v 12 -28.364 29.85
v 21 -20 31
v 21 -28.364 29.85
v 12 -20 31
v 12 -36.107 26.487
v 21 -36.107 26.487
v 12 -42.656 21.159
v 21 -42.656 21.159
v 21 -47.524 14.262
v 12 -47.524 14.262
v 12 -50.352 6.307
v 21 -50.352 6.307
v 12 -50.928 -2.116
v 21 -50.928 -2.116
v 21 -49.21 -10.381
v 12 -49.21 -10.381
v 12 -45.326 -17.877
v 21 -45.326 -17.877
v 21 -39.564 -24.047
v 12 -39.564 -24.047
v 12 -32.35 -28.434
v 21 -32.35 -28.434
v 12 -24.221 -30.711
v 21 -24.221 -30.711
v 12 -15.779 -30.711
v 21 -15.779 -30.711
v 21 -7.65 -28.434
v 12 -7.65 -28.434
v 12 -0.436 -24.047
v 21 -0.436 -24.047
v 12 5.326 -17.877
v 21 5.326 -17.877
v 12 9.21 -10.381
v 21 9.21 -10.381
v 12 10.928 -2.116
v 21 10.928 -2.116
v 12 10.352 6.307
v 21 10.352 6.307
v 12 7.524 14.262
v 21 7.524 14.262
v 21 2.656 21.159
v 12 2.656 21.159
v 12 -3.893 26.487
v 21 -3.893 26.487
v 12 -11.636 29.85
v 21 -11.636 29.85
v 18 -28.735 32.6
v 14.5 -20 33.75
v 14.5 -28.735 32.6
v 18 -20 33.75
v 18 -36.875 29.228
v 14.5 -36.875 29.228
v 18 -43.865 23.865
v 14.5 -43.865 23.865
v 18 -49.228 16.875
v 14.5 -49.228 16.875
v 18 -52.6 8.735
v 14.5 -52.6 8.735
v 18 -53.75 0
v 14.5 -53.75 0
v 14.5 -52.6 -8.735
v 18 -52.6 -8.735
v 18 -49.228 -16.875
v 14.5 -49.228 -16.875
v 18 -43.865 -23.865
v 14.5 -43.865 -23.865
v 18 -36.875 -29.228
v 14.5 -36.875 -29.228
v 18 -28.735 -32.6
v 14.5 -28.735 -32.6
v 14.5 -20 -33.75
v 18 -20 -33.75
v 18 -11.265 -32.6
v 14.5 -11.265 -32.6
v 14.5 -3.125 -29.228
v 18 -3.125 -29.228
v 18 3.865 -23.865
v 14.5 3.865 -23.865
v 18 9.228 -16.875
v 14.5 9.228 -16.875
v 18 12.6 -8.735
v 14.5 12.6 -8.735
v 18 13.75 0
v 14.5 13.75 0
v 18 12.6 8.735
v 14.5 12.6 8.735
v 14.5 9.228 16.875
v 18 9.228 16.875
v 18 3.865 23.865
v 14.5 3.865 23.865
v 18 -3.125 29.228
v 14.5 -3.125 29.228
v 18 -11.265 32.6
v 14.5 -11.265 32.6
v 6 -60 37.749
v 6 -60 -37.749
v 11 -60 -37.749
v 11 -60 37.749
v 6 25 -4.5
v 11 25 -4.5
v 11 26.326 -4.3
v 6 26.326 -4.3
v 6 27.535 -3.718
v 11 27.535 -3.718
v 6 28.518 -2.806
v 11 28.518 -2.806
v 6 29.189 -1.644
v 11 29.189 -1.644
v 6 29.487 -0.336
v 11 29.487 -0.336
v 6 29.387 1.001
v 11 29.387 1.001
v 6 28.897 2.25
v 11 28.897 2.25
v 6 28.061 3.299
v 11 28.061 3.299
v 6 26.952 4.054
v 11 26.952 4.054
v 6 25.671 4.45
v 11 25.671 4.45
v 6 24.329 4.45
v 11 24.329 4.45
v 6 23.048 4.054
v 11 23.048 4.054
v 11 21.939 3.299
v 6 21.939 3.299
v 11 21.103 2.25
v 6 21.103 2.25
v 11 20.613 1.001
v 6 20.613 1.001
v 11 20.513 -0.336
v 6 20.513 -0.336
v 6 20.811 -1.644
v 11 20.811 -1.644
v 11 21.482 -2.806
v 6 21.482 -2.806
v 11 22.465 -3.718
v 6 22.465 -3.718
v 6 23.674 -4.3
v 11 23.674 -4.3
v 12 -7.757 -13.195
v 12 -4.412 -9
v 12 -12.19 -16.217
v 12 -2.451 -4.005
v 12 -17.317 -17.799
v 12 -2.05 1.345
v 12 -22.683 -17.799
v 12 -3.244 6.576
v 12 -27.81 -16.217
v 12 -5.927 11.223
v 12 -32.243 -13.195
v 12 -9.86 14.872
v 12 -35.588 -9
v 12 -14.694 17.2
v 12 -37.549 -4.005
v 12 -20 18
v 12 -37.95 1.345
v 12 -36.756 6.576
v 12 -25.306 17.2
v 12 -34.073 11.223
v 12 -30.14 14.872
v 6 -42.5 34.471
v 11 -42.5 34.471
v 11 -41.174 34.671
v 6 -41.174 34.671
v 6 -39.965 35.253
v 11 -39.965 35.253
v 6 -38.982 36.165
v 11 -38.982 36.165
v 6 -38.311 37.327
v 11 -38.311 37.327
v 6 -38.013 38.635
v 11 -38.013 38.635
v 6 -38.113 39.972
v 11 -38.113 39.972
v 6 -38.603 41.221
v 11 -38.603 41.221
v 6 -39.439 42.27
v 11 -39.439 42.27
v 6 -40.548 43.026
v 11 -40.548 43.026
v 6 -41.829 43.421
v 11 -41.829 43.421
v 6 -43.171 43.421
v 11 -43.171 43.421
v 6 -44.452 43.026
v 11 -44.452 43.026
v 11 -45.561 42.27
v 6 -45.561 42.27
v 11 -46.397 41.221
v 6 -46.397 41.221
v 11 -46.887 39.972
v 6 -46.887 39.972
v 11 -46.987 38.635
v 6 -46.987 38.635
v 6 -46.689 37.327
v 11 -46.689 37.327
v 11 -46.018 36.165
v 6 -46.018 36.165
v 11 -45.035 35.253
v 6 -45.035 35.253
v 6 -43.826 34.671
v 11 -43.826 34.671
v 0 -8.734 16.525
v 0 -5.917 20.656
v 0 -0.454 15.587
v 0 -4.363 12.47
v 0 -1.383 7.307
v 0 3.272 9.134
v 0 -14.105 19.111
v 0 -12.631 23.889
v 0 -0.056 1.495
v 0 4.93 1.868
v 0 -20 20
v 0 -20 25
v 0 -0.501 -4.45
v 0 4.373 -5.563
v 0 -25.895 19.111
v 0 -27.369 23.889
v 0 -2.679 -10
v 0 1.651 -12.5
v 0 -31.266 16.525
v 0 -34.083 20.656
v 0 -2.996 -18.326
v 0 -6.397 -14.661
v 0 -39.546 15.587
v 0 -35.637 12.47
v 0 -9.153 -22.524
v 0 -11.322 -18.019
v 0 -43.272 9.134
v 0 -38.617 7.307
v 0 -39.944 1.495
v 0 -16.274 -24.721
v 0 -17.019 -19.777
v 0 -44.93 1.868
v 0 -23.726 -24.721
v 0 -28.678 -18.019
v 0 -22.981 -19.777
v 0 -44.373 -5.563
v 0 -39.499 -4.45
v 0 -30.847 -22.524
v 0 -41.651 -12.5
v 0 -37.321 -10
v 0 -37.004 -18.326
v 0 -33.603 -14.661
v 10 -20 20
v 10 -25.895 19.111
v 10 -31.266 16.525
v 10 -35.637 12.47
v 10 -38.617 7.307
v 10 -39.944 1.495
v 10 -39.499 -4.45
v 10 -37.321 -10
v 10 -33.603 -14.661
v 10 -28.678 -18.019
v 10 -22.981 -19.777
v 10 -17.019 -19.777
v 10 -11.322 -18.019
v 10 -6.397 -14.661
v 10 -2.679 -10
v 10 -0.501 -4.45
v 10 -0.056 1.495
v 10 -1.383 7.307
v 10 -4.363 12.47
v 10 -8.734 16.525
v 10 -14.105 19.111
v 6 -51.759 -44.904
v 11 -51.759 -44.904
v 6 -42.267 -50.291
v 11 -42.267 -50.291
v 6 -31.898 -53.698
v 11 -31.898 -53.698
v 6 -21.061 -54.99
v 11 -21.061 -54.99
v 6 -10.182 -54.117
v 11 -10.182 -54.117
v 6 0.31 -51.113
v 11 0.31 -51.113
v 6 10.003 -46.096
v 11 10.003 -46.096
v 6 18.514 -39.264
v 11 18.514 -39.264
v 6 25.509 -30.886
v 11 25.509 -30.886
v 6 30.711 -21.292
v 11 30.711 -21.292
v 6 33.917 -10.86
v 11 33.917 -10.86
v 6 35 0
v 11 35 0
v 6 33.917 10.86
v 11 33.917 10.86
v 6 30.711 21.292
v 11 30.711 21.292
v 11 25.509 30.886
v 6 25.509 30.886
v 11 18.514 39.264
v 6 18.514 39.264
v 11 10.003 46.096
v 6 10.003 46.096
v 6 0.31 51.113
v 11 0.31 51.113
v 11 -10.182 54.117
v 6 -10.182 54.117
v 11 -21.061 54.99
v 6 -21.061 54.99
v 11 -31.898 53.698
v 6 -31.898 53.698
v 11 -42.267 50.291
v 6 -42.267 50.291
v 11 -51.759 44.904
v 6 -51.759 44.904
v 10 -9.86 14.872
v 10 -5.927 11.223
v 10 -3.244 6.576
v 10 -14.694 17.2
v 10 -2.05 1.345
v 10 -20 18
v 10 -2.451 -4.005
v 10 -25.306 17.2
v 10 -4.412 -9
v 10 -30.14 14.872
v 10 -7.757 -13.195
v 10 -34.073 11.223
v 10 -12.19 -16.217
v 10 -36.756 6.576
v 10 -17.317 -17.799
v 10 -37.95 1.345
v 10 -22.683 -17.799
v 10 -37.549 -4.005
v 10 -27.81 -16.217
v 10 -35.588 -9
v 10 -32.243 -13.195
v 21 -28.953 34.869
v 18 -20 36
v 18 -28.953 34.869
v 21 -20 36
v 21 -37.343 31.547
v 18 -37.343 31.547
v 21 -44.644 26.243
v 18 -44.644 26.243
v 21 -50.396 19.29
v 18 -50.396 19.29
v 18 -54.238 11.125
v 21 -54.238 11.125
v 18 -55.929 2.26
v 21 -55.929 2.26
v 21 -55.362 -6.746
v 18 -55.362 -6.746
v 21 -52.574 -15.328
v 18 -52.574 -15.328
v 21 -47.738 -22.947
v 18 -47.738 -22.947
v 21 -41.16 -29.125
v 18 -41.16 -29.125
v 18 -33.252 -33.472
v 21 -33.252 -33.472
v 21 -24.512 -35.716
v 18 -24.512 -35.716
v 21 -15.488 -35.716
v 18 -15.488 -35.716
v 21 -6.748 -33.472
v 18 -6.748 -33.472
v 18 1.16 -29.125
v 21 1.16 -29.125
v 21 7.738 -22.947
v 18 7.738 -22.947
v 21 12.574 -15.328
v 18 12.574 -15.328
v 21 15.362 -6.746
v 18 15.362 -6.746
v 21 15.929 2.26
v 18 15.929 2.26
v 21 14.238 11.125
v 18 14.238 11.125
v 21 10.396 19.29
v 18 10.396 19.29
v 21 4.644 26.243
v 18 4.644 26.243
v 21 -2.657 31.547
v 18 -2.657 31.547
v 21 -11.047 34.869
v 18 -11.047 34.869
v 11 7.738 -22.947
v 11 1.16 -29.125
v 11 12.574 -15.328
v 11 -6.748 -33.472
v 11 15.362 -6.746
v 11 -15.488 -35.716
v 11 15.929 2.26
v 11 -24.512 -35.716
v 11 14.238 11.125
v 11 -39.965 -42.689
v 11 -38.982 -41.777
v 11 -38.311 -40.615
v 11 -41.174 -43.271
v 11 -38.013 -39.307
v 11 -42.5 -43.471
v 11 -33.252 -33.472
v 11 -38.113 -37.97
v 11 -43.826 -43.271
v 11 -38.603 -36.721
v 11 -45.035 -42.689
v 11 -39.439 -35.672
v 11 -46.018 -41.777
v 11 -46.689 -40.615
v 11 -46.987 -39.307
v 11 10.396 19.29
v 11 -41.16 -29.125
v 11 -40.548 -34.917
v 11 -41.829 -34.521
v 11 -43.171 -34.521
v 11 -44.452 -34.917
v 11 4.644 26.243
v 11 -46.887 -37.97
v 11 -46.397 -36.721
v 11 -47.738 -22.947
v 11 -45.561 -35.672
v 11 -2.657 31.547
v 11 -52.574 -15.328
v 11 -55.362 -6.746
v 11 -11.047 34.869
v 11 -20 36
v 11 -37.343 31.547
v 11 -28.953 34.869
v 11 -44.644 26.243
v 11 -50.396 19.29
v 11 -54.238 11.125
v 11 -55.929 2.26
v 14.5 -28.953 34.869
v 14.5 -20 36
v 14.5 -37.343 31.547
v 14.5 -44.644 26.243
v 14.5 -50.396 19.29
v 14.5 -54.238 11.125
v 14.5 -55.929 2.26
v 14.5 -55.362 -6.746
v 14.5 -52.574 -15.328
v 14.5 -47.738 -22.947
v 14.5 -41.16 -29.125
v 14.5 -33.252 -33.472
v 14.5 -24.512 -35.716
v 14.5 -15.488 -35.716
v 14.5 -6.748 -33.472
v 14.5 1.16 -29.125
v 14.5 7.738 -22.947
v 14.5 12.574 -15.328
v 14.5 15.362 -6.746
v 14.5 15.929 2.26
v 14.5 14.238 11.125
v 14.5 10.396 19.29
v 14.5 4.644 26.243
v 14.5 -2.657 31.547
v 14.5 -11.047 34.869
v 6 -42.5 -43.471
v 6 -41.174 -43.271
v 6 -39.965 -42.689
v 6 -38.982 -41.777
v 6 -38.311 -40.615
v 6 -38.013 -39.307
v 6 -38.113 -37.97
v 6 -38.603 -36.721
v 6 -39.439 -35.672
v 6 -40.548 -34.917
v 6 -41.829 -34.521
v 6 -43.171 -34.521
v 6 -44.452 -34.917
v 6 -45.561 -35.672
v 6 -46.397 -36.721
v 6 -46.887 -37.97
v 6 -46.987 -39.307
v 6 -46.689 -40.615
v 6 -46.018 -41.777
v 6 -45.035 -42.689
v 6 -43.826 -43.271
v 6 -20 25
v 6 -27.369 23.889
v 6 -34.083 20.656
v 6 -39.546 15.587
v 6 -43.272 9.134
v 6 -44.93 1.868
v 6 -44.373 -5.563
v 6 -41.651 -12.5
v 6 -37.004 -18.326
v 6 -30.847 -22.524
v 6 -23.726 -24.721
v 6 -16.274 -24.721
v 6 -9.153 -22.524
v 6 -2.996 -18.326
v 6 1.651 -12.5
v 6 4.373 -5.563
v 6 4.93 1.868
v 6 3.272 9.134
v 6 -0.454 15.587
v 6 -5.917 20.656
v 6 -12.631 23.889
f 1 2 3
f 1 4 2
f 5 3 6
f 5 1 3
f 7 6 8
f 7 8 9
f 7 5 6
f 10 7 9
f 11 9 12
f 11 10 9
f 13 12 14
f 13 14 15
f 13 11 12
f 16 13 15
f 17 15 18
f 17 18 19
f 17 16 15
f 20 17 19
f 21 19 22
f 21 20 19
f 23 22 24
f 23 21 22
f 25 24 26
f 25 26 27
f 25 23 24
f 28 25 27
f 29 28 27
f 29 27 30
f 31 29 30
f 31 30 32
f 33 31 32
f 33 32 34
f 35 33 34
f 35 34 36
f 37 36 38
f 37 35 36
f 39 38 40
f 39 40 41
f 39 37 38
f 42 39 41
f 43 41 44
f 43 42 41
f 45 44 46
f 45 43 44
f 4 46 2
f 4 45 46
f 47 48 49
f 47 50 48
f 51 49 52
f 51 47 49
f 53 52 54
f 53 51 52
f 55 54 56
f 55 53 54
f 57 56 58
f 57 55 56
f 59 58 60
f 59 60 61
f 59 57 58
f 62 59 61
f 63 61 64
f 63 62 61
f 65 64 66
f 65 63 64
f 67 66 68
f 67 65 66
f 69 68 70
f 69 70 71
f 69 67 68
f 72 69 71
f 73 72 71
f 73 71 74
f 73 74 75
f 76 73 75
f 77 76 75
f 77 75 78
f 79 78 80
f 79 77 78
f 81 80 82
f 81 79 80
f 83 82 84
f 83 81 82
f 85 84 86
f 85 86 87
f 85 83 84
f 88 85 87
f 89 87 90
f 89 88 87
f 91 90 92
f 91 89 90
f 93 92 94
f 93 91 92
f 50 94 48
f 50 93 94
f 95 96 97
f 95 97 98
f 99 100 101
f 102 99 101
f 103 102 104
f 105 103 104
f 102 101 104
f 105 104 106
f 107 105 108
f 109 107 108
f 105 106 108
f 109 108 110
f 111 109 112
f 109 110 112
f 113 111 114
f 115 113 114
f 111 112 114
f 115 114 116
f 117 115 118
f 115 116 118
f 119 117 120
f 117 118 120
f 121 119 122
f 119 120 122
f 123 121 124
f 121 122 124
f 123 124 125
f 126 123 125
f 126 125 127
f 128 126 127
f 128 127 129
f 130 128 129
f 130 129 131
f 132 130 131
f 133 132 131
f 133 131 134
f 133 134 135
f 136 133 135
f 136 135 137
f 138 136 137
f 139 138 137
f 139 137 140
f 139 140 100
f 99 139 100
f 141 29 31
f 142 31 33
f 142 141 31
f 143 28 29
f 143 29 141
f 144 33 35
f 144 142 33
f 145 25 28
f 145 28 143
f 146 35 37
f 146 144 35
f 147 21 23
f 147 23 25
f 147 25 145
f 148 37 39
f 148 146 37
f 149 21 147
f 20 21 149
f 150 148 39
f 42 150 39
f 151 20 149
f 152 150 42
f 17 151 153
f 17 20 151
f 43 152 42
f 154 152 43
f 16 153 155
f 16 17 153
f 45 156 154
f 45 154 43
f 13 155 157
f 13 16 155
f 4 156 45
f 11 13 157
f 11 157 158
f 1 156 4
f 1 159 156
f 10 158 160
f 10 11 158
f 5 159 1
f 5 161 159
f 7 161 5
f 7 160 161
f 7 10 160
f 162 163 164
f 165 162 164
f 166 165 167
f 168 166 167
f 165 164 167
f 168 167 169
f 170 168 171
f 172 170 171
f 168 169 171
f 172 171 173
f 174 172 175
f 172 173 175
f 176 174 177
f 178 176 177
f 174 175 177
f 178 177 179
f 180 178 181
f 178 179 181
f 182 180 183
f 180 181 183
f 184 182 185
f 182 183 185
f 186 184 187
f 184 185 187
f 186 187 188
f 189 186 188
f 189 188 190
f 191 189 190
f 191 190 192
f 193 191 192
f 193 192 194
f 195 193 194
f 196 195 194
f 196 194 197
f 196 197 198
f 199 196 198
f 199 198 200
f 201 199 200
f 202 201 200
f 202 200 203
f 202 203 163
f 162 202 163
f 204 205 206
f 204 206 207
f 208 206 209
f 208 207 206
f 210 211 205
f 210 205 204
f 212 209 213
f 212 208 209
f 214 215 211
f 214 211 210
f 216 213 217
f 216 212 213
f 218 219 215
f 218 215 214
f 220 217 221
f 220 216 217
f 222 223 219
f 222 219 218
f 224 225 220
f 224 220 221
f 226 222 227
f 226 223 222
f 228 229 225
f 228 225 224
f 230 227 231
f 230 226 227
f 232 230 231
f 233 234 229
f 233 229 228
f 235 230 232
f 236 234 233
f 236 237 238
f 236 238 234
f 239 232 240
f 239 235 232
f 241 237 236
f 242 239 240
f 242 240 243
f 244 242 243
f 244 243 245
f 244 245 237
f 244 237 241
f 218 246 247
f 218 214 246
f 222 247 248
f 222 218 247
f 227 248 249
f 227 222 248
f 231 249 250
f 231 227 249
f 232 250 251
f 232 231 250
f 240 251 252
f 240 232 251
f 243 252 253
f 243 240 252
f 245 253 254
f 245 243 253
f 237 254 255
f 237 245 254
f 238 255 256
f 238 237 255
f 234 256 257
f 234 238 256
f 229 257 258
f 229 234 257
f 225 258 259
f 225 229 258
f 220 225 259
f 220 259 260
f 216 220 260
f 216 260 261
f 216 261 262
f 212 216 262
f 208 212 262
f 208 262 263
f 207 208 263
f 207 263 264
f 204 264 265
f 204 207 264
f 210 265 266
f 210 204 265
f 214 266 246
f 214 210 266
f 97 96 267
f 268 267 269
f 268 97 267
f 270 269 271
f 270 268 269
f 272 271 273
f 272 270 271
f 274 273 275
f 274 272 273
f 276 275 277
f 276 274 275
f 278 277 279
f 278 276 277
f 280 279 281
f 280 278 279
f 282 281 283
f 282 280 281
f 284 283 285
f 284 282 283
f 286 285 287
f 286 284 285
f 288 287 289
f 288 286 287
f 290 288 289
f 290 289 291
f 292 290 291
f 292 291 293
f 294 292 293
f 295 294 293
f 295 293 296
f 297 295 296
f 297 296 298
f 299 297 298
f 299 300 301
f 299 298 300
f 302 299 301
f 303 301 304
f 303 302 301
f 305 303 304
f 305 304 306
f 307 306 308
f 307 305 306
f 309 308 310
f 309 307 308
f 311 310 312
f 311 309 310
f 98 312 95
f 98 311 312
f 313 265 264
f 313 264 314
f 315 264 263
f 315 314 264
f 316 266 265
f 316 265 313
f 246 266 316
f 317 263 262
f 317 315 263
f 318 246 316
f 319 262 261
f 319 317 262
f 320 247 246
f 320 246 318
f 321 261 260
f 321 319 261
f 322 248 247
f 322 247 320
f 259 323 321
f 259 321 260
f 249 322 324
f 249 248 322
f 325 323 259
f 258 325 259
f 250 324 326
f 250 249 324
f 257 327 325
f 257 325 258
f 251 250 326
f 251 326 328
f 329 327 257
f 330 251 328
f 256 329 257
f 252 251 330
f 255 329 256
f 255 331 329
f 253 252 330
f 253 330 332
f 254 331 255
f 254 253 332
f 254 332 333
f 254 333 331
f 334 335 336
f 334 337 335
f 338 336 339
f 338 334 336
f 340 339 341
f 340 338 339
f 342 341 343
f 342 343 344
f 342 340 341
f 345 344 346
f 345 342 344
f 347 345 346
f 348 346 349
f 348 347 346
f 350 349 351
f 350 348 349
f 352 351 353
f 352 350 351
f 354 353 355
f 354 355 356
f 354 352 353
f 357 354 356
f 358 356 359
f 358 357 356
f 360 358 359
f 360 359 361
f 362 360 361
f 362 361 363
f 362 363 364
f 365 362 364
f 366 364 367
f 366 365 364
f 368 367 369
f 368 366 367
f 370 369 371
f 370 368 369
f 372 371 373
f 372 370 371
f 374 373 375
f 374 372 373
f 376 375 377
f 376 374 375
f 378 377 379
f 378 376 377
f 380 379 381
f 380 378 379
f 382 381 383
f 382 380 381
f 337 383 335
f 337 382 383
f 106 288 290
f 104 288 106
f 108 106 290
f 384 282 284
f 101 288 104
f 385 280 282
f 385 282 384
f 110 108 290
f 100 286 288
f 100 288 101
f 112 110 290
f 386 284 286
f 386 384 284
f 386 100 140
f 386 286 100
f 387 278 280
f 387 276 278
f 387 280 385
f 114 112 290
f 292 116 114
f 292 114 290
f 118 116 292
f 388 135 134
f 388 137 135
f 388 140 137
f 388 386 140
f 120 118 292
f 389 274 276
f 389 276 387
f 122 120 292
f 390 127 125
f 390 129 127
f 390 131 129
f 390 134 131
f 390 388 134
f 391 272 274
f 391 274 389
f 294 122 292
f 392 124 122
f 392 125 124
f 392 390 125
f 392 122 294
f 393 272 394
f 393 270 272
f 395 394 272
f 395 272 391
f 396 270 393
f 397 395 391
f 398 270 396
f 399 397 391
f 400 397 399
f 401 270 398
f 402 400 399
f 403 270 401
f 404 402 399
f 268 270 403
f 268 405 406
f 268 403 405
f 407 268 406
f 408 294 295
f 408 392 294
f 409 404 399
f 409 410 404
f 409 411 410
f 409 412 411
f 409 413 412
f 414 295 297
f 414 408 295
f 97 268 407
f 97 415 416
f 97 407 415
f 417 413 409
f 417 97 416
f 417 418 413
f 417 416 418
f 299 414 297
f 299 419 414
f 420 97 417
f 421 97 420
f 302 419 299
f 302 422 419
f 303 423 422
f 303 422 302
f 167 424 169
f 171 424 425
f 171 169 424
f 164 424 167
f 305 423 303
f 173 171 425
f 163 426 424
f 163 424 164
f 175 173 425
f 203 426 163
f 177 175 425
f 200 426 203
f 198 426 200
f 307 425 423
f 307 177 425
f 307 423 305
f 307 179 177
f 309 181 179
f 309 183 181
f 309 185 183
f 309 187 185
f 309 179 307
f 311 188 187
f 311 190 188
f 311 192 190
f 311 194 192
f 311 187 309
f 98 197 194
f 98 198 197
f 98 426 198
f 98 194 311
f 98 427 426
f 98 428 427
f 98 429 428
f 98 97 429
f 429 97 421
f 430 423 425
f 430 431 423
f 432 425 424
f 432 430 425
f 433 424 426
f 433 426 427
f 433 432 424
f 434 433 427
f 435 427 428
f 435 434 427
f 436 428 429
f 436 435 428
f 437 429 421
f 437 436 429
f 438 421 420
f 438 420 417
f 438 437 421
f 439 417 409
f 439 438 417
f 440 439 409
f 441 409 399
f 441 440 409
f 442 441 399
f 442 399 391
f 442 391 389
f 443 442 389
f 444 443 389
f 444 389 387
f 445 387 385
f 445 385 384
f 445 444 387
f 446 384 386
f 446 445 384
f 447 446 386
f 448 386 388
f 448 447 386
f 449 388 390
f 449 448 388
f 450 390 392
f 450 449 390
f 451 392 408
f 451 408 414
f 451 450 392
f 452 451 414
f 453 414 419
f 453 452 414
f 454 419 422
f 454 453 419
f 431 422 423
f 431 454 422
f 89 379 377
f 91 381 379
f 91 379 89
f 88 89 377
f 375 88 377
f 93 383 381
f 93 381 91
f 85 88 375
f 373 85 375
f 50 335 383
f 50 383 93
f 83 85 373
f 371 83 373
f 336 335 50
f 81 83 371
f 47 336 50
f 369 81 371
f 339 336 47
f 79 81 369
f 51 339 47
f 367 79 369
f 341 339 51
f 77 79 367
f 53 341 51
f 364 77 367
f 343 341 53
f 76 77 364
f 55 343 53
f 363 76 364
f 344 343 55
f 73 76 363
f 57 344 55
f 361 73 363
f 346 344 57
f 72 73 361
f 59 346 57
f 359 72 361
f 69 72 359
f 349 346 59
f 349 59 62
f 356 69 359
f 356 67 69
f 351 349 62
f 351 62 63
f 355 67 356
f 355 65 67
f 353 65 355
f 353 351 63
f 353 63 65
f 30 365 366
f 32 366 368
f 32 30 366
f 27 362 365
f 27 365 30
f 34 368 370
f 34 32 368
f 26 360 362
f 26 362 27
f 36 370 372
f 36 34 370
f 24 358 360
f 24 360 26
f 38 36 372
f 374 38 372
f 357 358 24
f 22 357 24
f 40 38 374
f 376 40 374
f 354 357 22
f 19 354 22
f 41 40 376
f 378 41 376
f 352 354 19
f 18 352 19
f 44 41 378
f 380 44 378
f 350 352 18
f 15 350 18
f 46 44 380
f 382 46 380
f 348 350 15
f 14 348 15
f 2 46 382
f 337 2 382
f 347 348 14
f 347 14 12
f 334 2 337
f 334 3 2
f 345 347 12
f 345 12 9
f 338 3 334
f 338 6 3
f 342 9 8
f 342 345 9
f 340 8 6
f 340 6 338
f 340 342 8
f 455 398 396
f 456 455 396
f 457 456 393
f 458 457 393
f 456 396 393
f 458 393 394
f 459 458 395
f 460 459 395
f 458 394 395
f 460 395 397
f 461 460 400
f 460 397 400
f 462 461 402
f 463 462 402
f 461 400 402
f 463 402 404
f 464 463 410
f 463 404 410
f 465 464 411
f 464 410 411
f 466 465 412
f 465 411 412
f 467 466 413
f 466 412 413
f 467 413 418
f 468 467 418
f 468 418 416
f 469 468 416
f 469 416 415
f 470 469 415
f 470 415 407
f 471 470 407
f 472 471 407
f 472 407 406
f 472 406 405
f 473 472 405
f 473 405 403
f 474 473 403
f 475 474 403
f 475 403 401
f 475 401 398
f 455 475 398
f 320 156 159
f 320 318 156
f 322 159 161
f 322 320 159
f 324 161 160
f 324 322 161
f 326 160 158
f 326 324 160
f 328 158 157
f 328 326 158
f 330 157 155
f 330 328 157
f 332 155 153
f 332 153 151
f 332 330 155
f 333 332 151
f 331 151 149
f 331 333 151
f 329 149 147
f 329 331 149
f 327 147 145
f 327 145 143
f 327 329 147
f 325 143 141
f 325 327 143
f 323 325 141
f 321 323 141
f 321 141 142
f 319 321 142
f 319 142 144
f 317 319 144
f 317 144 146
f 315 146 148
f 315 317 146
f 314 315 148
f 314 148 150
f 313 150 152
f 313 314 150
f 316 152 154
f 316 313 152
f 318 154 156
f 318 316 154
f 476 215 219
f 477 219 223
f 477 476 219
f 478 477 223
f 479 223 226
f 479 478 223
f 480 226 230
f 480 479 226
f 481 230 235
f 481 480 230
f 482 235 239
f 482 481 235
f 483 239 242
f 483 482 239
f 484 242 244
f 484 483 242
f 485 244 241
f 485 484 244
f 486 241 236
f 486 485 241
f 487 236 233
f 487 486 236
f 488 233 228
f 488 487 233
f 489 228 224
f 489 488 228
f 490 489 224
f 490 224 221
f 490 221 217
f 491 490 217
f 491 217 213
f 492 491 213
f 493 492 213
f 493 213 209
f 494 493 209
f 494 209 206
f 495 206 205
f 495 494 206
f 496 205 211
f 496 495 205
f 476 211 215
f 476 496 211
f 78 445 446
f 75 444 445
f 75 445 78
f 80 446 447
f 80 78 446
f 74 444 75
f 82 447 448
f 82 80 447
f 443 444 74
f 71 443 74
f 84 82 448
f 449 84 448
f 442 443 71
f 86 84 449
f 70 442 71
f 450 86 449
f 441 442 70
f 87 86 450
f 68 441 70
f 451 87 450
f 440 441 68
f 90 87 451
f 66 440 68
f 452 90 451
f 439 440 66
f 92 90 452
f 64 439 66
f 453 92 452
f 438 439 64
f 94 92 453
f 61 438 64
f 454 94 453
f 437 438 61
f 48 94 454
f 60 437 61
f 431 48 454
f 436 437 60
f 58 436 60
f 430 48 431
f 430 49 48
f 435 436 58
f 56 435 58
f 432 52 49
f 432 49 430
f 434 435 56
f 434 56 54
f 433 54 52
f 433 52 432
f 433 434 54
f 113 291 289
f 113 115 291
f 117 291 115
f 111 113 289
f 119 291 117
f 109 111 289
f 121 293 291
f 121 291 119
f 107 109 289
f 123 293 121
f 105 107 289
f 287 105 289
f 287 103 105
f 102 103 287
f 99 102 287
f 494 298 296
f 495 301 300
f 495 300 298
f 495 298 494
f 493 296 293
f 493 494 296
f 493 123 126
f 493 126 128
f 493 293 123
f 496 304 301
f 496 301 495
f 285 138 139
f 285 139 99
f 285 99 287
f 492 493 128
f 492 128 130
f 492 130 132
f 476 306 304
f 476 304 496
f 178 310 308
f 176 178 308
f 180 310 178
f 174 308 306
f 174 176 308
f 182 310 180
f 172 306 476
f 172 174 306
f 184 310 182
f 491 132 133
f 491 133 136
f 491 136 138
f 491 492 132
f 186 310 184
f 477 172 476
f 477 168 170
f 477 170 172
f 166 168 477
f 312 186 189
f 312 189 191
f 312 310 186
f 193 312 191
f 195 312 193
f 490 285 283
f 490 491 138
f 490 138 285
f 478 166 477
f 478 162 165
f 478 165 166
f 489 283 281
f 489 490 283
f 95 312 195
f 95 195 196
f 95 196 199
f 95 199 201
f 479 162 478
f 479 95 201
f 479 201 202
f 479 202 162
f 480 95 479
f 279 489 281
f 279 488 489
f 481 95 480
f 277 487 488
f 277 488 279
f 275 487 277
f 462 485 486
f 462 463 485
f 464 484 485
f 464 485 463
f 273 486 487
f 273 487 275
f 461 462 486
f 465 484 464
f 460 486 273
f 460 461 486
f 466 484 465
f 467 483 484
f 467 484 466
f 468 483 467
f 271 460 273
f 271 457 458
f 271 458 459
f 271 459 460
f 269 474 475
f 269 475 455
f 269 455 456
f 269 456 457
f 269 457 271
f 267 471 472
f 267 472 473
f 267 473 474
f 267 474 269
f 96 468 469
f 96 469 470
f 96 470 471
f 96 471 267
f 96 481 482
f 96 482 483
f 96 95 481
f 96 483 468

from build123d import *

# Parameters (mm, degrees)
SCHIZZO2_R               = 4.5
TAGLIO_ESTRUSIONE1_DEPTH = 94.653617122
SCHIZZO3_W               = 75.498344352
SCHIZZO3_H               = 30
TAGLIO_ESTRUSIONE2_DEPTH = 95.207218407


with BuildPart() as part:
    # Schizzo1 → Rivoluzione1 (revolve)
    with BuildSketch(Plane.XY):
        Polygon((0, 0), (0, 5), (6, 5), (6, 35), (11, 35), (11, 16), (14.5, 16), (14.5, 13.75), (18, 13.75), (18, 16), (21, 16), (21, 11), (12, 11), (12, -2), (10, -2), (10, 0), align=None)
    revolve(axis=Axis((-8.306759574, -20, 0), (1, 0, 0)))

    # Schizzo2 → Taglio-Estrusione1 (cut, through all)
    with BuildSketch(Plane(origin=(11, 0, 0), x_dir=(0, 0, -1), z_dir=(1, 0, 0))):
        with Locations((0, 25)):
            Circle(SCHIZZO2_R)
        with Locations((88.334591186, -128)):
            Circle(SCHIZZO2_R)
        with Locations((-88.334591186, -128)):
            Circle(SCHIZZO2_R)
        with Locations((38.97114317, -42.5)):
            Circle(SCHIZZO2_R)
        with Locations((-38.97114317, -42.5)):
            Circle(SCHIZZO2_R)
    extrude(amount=-TAGLIO_ESTRUSIONE1_DEPTH, mode=Mode.SUBTRACT)

    # Schizzo3 → Taglio-Estrusione2 (cut, through all)
    with BuildSketch(Plane.ZY.offset(-6)):
        with Locations((0, -75)):
            Rectangle(SCHIZZO3_W, SCHIZZO3_H)
    extrude(amount=-TAGLIO_ESTRUSIONE2_DEPTH, mode=Mode.SUBTRACT)


solid = part.part
